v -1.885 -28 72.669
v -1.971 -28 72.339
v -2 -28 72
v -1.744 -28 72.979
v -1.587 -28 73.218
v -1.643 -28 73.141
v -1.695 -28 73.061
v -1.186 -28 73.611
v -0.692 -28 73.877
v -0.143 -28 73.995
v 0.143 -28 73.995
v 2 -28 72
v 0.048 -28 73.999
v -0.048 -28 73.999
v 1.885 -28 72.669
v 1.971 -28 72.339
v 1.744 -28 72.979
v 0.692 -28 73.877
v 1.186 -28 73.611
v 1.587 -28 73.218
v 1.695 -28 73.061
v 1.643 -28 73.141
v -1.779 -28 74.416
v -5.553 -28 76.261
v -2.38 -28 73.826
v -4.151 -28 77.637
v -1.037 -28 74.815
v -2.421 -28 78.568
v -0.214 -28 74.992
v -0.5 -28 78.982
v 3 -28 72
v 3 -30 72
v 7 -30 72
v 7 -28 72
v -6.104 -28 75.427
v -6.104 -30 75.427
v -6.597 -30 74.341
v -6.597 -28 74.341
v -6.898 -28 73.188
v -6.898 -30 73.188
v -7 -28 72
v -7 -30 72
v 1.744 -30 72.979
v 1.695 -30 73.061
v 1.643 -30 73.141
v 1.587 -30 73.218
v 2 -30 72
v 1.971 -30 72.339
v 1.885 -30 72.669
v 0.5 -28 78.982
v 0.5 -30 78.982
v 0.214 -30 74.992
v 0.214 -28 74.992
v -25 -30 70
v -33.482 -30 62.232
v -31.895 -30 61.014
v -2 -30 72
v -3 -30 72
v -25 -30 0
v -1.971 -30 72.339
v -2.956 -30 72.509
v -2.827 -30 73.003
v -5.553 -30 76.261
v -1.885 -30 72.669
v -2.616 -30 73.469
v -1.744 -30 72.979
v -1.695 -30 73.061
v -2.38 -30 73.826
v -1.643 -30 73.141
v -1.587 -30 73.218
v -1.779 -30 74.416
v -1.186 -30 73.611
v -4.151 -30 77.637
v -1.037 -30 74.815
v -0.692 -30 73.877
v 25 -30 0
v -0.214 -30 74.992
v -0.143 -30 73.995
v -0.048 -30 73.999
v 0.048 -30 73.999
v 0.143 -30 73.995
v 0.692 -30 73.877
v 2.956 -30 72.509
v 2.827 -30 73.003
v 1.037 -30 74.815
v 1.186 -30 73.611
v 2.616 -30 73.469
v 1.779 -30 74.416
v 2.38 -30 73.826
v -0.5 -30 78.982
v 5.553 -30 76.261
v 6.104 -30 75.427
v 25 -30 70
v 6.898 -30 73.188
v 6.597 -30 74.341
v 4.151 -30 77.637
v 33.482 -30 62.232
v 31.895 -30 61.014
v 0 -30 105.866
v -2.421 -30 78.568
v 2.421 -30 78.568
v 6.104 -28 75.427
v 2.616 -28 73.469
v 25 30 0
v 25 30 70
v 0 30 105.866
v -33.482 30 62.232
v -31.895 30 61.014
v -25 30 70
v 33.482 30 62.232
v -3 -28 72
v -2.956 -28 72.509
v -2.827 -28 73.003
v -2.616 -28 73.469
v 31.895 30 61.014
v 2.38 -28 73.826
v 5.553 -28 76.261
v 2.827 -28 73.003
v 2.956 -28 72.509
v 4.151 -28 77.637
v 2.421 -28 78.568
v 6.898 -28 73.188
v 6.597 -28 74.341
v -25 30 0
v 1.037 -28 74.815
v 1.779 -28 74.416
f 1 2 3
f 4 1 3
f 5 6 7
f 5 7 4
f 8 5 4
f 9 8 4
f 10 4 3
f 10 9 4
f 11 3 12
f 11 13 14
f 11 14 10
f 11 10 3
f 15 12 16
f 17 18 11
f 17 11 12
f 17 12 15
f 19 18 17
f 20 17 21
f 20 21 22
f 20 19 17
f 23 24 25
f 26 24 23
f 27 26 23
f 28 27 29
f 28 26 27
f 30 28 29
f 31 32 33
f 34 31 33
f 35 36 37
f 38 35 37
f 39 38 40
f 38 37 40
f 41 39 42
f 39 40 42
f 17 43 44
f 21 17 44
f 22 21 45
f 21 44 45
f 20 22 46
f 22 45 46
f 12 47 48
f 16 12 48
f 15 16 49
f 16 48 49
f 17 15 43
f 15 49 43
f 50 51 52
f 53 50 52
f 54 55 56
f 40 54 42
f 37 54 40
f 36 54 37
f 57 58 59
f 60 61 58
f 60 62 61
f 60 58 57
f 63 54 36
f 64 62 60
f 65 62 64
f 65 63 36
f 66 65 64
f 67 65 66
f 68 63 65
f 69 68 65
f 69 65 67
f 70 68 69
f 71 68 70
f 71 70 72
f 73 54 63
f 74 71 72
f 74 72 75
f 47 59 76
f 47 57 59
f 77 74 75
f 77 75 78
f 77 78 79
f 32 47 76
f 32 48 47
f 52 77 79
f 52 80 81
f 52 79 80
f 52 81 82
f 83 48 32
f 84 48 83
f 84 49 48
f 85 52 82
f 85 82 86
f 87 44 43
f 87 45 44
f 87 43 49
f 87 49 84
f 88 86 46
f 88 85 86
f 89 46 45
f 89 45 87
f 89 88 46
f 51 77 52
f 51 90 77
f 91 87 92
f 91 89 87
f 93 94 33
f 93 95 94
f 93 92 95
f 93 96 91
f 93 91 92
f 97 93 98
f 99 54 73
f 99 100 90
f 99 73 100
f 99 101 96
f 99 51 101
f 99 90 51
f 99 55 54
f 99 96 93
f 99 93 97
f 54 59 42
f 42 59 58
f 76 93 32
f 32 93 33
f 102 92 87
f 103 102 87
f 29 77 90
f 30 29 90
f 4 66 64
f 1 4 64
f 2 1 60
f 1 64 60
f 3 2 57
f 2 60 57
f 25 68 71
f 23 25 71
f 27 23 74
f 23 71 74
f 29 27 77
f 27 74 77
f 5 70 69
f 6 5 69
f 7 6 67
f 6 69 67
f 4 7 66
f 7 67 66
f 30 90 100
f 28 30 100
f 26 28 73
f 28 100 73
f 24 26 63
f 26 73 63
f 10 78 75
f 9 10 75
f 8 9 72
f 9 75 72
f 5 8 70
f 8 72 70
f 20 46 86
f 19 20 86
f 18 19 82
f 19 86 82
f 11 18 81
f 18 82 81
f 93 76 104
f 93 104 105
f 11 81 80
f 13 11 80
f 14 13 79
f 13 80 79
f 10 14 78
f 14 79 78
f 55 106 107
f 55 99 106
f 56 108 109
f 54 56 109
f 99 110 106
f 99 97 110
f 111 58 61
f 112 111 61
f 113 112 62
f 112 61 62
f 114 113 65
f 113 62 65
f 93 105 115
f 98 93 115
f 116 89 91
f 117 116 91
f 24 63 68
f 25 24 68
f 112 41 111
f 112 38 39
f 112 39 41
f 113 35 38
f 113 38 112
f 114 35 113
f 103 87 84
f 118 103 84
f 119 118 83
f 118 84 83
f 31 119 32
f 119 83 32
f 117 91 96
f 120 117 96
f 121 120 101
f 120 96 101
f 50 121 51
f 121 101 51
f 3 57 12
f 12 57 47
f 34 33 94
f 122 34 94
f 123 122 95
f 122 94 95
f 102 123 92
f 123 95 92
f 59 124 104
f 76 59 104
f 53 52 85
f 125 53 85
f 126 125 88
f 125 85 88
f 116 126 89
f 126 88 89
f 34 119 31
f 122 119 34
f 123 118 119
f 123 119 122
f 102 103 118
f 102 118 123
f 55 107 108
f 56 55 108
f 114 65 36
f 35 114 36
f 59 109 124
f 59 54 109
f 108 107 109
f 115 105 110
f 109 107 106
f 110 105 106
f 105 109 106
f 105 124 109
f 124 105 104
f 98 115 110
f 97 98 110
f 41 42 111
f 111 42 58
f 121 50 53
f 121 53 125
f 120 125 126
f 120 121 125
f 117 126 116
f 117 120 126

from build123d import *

# Parameters (mm, degrees)
F1_DEPTH      = 30
F1_DEPTH_BACK = 30
F3_DEPTH      = 30
F3_DEPTH_BACK = 30
F5_DEPTH      = 2


with BuildPart() as f1:
    # F0 (on Front) → F1 (new body, two sides)
    with BuildSketch(Plane.XZ) as f1_sk:
        Polygon((-25, 70), (-25, 0), (0, 0), (25, 0), (25, 70), (0, 102.580634), align=None)
    extrude(amount=F1_DEPTH)
    extrude(f1_sk.sketch, amount=-F1_DEPTH_BACK)

    # F2 (on Front) → F3 (join, two sides)
    with BuildSketch(Plane.XZ) as f3_sk:
        Polygon((-33.481879, 62.23156), (-31.895172, 61.014037), (0, 102.580634), (31.895172, 61.014037), (33.481879, 62.23156), (0, 105.865994), align=None)
    extrude(amount=F3_DEPTH)
    extrude(f3_sk.sketch, amount=-F3_DEPTH_BACK)

    # F4 (on face) → F5 (cut)
    with BuildSketch(Plane.XZ.offset(30)):
        with BuildLine():
            Line((-7, 72), (-3, 72))
            ThreePointArc((-3, 72), (-2.902414, 72.758942), (-2.616005, 73.468509))
            Line((-2.616005, 73.468509), (-6.104012, 75.42652))
            ThreePointArc((-6.104012, 75.42652), (-6.7723, 73.770864), (-7, 72))
        make_face()
        with BuildLine():
            Line((-5.553473, 76.26133), (-2.38006, 73.826284))
            ThreePointArc((-2.38006, 73.826284), (-1.422173, 74.641481), (-0.214286, 74.992337))
            Line((-0.214286, 74.992337), (-0.5, 78.98212))
            ThreePointArc((-0.5, 78.98212), (-3.318405, 78.163456), (-5.553473, 76.26133))
        make_face()
        with BuildLine():
            ThreePointArc((5.553473, 76.26133), (3.318405, 78.163456), (0.5, 78.98212))
            Line((0.5, 78.98212), (0.214286, 74.992337))
            ThreePointArc((0.214286, 74.992337), (1.422173, 74.641481), (2.38006, 73.826284))
            Line((2.38006, 73.826284), (5.553473, 76.26133))
        make_face()
        with BuildLine():
            ThreePointArc((7, 72), (6.7723, 73.770864), (6.104012, 75.42652))
            Line((6.104012, 75.42652), (2.616005, 73.468509))
            ThreePointArc((2.616005, 73.468509), (2.902414, 72.758942), (3, 72))
            Line((3, 72), (7, 72))
        make_face()
        with BuildLine():
            ThreePointArc((-1.744003, 72.979006), (-1.934943, 72.505961), (-2, 72))
            Line((-2, 72), (0, 72))
            Line((0, 72), (2, 72))
            ThreePointArc((2, 72), (1.934943, 72.505961), (1.744003, 72.979006))
            ThreePointArc((1.744003, 72.979006), (1.66962, 73.101077), (1.586707, 73.217523))
            ThreePointArc((1.586707, 73.217523), (0.948116, 73.760987), (0.142857, 73.994891))
            ThreePointArc((0.142857, 73.994891), (0, 74), (-0.142857, 73.994891))
            ThreePointArc((-0.142857, 73.994891), (-0.948116, 73.760987), (-1.586707, 73.217523))
            ThreePointArc((-1.586707, 73.217523), (-1.66962, 73.101077), (-1.744003, 72.979006))
        make_face()
    extrude(amount=-F5_DEPTH, mode=Mode.SUBTRACT)


solid = f1.part
